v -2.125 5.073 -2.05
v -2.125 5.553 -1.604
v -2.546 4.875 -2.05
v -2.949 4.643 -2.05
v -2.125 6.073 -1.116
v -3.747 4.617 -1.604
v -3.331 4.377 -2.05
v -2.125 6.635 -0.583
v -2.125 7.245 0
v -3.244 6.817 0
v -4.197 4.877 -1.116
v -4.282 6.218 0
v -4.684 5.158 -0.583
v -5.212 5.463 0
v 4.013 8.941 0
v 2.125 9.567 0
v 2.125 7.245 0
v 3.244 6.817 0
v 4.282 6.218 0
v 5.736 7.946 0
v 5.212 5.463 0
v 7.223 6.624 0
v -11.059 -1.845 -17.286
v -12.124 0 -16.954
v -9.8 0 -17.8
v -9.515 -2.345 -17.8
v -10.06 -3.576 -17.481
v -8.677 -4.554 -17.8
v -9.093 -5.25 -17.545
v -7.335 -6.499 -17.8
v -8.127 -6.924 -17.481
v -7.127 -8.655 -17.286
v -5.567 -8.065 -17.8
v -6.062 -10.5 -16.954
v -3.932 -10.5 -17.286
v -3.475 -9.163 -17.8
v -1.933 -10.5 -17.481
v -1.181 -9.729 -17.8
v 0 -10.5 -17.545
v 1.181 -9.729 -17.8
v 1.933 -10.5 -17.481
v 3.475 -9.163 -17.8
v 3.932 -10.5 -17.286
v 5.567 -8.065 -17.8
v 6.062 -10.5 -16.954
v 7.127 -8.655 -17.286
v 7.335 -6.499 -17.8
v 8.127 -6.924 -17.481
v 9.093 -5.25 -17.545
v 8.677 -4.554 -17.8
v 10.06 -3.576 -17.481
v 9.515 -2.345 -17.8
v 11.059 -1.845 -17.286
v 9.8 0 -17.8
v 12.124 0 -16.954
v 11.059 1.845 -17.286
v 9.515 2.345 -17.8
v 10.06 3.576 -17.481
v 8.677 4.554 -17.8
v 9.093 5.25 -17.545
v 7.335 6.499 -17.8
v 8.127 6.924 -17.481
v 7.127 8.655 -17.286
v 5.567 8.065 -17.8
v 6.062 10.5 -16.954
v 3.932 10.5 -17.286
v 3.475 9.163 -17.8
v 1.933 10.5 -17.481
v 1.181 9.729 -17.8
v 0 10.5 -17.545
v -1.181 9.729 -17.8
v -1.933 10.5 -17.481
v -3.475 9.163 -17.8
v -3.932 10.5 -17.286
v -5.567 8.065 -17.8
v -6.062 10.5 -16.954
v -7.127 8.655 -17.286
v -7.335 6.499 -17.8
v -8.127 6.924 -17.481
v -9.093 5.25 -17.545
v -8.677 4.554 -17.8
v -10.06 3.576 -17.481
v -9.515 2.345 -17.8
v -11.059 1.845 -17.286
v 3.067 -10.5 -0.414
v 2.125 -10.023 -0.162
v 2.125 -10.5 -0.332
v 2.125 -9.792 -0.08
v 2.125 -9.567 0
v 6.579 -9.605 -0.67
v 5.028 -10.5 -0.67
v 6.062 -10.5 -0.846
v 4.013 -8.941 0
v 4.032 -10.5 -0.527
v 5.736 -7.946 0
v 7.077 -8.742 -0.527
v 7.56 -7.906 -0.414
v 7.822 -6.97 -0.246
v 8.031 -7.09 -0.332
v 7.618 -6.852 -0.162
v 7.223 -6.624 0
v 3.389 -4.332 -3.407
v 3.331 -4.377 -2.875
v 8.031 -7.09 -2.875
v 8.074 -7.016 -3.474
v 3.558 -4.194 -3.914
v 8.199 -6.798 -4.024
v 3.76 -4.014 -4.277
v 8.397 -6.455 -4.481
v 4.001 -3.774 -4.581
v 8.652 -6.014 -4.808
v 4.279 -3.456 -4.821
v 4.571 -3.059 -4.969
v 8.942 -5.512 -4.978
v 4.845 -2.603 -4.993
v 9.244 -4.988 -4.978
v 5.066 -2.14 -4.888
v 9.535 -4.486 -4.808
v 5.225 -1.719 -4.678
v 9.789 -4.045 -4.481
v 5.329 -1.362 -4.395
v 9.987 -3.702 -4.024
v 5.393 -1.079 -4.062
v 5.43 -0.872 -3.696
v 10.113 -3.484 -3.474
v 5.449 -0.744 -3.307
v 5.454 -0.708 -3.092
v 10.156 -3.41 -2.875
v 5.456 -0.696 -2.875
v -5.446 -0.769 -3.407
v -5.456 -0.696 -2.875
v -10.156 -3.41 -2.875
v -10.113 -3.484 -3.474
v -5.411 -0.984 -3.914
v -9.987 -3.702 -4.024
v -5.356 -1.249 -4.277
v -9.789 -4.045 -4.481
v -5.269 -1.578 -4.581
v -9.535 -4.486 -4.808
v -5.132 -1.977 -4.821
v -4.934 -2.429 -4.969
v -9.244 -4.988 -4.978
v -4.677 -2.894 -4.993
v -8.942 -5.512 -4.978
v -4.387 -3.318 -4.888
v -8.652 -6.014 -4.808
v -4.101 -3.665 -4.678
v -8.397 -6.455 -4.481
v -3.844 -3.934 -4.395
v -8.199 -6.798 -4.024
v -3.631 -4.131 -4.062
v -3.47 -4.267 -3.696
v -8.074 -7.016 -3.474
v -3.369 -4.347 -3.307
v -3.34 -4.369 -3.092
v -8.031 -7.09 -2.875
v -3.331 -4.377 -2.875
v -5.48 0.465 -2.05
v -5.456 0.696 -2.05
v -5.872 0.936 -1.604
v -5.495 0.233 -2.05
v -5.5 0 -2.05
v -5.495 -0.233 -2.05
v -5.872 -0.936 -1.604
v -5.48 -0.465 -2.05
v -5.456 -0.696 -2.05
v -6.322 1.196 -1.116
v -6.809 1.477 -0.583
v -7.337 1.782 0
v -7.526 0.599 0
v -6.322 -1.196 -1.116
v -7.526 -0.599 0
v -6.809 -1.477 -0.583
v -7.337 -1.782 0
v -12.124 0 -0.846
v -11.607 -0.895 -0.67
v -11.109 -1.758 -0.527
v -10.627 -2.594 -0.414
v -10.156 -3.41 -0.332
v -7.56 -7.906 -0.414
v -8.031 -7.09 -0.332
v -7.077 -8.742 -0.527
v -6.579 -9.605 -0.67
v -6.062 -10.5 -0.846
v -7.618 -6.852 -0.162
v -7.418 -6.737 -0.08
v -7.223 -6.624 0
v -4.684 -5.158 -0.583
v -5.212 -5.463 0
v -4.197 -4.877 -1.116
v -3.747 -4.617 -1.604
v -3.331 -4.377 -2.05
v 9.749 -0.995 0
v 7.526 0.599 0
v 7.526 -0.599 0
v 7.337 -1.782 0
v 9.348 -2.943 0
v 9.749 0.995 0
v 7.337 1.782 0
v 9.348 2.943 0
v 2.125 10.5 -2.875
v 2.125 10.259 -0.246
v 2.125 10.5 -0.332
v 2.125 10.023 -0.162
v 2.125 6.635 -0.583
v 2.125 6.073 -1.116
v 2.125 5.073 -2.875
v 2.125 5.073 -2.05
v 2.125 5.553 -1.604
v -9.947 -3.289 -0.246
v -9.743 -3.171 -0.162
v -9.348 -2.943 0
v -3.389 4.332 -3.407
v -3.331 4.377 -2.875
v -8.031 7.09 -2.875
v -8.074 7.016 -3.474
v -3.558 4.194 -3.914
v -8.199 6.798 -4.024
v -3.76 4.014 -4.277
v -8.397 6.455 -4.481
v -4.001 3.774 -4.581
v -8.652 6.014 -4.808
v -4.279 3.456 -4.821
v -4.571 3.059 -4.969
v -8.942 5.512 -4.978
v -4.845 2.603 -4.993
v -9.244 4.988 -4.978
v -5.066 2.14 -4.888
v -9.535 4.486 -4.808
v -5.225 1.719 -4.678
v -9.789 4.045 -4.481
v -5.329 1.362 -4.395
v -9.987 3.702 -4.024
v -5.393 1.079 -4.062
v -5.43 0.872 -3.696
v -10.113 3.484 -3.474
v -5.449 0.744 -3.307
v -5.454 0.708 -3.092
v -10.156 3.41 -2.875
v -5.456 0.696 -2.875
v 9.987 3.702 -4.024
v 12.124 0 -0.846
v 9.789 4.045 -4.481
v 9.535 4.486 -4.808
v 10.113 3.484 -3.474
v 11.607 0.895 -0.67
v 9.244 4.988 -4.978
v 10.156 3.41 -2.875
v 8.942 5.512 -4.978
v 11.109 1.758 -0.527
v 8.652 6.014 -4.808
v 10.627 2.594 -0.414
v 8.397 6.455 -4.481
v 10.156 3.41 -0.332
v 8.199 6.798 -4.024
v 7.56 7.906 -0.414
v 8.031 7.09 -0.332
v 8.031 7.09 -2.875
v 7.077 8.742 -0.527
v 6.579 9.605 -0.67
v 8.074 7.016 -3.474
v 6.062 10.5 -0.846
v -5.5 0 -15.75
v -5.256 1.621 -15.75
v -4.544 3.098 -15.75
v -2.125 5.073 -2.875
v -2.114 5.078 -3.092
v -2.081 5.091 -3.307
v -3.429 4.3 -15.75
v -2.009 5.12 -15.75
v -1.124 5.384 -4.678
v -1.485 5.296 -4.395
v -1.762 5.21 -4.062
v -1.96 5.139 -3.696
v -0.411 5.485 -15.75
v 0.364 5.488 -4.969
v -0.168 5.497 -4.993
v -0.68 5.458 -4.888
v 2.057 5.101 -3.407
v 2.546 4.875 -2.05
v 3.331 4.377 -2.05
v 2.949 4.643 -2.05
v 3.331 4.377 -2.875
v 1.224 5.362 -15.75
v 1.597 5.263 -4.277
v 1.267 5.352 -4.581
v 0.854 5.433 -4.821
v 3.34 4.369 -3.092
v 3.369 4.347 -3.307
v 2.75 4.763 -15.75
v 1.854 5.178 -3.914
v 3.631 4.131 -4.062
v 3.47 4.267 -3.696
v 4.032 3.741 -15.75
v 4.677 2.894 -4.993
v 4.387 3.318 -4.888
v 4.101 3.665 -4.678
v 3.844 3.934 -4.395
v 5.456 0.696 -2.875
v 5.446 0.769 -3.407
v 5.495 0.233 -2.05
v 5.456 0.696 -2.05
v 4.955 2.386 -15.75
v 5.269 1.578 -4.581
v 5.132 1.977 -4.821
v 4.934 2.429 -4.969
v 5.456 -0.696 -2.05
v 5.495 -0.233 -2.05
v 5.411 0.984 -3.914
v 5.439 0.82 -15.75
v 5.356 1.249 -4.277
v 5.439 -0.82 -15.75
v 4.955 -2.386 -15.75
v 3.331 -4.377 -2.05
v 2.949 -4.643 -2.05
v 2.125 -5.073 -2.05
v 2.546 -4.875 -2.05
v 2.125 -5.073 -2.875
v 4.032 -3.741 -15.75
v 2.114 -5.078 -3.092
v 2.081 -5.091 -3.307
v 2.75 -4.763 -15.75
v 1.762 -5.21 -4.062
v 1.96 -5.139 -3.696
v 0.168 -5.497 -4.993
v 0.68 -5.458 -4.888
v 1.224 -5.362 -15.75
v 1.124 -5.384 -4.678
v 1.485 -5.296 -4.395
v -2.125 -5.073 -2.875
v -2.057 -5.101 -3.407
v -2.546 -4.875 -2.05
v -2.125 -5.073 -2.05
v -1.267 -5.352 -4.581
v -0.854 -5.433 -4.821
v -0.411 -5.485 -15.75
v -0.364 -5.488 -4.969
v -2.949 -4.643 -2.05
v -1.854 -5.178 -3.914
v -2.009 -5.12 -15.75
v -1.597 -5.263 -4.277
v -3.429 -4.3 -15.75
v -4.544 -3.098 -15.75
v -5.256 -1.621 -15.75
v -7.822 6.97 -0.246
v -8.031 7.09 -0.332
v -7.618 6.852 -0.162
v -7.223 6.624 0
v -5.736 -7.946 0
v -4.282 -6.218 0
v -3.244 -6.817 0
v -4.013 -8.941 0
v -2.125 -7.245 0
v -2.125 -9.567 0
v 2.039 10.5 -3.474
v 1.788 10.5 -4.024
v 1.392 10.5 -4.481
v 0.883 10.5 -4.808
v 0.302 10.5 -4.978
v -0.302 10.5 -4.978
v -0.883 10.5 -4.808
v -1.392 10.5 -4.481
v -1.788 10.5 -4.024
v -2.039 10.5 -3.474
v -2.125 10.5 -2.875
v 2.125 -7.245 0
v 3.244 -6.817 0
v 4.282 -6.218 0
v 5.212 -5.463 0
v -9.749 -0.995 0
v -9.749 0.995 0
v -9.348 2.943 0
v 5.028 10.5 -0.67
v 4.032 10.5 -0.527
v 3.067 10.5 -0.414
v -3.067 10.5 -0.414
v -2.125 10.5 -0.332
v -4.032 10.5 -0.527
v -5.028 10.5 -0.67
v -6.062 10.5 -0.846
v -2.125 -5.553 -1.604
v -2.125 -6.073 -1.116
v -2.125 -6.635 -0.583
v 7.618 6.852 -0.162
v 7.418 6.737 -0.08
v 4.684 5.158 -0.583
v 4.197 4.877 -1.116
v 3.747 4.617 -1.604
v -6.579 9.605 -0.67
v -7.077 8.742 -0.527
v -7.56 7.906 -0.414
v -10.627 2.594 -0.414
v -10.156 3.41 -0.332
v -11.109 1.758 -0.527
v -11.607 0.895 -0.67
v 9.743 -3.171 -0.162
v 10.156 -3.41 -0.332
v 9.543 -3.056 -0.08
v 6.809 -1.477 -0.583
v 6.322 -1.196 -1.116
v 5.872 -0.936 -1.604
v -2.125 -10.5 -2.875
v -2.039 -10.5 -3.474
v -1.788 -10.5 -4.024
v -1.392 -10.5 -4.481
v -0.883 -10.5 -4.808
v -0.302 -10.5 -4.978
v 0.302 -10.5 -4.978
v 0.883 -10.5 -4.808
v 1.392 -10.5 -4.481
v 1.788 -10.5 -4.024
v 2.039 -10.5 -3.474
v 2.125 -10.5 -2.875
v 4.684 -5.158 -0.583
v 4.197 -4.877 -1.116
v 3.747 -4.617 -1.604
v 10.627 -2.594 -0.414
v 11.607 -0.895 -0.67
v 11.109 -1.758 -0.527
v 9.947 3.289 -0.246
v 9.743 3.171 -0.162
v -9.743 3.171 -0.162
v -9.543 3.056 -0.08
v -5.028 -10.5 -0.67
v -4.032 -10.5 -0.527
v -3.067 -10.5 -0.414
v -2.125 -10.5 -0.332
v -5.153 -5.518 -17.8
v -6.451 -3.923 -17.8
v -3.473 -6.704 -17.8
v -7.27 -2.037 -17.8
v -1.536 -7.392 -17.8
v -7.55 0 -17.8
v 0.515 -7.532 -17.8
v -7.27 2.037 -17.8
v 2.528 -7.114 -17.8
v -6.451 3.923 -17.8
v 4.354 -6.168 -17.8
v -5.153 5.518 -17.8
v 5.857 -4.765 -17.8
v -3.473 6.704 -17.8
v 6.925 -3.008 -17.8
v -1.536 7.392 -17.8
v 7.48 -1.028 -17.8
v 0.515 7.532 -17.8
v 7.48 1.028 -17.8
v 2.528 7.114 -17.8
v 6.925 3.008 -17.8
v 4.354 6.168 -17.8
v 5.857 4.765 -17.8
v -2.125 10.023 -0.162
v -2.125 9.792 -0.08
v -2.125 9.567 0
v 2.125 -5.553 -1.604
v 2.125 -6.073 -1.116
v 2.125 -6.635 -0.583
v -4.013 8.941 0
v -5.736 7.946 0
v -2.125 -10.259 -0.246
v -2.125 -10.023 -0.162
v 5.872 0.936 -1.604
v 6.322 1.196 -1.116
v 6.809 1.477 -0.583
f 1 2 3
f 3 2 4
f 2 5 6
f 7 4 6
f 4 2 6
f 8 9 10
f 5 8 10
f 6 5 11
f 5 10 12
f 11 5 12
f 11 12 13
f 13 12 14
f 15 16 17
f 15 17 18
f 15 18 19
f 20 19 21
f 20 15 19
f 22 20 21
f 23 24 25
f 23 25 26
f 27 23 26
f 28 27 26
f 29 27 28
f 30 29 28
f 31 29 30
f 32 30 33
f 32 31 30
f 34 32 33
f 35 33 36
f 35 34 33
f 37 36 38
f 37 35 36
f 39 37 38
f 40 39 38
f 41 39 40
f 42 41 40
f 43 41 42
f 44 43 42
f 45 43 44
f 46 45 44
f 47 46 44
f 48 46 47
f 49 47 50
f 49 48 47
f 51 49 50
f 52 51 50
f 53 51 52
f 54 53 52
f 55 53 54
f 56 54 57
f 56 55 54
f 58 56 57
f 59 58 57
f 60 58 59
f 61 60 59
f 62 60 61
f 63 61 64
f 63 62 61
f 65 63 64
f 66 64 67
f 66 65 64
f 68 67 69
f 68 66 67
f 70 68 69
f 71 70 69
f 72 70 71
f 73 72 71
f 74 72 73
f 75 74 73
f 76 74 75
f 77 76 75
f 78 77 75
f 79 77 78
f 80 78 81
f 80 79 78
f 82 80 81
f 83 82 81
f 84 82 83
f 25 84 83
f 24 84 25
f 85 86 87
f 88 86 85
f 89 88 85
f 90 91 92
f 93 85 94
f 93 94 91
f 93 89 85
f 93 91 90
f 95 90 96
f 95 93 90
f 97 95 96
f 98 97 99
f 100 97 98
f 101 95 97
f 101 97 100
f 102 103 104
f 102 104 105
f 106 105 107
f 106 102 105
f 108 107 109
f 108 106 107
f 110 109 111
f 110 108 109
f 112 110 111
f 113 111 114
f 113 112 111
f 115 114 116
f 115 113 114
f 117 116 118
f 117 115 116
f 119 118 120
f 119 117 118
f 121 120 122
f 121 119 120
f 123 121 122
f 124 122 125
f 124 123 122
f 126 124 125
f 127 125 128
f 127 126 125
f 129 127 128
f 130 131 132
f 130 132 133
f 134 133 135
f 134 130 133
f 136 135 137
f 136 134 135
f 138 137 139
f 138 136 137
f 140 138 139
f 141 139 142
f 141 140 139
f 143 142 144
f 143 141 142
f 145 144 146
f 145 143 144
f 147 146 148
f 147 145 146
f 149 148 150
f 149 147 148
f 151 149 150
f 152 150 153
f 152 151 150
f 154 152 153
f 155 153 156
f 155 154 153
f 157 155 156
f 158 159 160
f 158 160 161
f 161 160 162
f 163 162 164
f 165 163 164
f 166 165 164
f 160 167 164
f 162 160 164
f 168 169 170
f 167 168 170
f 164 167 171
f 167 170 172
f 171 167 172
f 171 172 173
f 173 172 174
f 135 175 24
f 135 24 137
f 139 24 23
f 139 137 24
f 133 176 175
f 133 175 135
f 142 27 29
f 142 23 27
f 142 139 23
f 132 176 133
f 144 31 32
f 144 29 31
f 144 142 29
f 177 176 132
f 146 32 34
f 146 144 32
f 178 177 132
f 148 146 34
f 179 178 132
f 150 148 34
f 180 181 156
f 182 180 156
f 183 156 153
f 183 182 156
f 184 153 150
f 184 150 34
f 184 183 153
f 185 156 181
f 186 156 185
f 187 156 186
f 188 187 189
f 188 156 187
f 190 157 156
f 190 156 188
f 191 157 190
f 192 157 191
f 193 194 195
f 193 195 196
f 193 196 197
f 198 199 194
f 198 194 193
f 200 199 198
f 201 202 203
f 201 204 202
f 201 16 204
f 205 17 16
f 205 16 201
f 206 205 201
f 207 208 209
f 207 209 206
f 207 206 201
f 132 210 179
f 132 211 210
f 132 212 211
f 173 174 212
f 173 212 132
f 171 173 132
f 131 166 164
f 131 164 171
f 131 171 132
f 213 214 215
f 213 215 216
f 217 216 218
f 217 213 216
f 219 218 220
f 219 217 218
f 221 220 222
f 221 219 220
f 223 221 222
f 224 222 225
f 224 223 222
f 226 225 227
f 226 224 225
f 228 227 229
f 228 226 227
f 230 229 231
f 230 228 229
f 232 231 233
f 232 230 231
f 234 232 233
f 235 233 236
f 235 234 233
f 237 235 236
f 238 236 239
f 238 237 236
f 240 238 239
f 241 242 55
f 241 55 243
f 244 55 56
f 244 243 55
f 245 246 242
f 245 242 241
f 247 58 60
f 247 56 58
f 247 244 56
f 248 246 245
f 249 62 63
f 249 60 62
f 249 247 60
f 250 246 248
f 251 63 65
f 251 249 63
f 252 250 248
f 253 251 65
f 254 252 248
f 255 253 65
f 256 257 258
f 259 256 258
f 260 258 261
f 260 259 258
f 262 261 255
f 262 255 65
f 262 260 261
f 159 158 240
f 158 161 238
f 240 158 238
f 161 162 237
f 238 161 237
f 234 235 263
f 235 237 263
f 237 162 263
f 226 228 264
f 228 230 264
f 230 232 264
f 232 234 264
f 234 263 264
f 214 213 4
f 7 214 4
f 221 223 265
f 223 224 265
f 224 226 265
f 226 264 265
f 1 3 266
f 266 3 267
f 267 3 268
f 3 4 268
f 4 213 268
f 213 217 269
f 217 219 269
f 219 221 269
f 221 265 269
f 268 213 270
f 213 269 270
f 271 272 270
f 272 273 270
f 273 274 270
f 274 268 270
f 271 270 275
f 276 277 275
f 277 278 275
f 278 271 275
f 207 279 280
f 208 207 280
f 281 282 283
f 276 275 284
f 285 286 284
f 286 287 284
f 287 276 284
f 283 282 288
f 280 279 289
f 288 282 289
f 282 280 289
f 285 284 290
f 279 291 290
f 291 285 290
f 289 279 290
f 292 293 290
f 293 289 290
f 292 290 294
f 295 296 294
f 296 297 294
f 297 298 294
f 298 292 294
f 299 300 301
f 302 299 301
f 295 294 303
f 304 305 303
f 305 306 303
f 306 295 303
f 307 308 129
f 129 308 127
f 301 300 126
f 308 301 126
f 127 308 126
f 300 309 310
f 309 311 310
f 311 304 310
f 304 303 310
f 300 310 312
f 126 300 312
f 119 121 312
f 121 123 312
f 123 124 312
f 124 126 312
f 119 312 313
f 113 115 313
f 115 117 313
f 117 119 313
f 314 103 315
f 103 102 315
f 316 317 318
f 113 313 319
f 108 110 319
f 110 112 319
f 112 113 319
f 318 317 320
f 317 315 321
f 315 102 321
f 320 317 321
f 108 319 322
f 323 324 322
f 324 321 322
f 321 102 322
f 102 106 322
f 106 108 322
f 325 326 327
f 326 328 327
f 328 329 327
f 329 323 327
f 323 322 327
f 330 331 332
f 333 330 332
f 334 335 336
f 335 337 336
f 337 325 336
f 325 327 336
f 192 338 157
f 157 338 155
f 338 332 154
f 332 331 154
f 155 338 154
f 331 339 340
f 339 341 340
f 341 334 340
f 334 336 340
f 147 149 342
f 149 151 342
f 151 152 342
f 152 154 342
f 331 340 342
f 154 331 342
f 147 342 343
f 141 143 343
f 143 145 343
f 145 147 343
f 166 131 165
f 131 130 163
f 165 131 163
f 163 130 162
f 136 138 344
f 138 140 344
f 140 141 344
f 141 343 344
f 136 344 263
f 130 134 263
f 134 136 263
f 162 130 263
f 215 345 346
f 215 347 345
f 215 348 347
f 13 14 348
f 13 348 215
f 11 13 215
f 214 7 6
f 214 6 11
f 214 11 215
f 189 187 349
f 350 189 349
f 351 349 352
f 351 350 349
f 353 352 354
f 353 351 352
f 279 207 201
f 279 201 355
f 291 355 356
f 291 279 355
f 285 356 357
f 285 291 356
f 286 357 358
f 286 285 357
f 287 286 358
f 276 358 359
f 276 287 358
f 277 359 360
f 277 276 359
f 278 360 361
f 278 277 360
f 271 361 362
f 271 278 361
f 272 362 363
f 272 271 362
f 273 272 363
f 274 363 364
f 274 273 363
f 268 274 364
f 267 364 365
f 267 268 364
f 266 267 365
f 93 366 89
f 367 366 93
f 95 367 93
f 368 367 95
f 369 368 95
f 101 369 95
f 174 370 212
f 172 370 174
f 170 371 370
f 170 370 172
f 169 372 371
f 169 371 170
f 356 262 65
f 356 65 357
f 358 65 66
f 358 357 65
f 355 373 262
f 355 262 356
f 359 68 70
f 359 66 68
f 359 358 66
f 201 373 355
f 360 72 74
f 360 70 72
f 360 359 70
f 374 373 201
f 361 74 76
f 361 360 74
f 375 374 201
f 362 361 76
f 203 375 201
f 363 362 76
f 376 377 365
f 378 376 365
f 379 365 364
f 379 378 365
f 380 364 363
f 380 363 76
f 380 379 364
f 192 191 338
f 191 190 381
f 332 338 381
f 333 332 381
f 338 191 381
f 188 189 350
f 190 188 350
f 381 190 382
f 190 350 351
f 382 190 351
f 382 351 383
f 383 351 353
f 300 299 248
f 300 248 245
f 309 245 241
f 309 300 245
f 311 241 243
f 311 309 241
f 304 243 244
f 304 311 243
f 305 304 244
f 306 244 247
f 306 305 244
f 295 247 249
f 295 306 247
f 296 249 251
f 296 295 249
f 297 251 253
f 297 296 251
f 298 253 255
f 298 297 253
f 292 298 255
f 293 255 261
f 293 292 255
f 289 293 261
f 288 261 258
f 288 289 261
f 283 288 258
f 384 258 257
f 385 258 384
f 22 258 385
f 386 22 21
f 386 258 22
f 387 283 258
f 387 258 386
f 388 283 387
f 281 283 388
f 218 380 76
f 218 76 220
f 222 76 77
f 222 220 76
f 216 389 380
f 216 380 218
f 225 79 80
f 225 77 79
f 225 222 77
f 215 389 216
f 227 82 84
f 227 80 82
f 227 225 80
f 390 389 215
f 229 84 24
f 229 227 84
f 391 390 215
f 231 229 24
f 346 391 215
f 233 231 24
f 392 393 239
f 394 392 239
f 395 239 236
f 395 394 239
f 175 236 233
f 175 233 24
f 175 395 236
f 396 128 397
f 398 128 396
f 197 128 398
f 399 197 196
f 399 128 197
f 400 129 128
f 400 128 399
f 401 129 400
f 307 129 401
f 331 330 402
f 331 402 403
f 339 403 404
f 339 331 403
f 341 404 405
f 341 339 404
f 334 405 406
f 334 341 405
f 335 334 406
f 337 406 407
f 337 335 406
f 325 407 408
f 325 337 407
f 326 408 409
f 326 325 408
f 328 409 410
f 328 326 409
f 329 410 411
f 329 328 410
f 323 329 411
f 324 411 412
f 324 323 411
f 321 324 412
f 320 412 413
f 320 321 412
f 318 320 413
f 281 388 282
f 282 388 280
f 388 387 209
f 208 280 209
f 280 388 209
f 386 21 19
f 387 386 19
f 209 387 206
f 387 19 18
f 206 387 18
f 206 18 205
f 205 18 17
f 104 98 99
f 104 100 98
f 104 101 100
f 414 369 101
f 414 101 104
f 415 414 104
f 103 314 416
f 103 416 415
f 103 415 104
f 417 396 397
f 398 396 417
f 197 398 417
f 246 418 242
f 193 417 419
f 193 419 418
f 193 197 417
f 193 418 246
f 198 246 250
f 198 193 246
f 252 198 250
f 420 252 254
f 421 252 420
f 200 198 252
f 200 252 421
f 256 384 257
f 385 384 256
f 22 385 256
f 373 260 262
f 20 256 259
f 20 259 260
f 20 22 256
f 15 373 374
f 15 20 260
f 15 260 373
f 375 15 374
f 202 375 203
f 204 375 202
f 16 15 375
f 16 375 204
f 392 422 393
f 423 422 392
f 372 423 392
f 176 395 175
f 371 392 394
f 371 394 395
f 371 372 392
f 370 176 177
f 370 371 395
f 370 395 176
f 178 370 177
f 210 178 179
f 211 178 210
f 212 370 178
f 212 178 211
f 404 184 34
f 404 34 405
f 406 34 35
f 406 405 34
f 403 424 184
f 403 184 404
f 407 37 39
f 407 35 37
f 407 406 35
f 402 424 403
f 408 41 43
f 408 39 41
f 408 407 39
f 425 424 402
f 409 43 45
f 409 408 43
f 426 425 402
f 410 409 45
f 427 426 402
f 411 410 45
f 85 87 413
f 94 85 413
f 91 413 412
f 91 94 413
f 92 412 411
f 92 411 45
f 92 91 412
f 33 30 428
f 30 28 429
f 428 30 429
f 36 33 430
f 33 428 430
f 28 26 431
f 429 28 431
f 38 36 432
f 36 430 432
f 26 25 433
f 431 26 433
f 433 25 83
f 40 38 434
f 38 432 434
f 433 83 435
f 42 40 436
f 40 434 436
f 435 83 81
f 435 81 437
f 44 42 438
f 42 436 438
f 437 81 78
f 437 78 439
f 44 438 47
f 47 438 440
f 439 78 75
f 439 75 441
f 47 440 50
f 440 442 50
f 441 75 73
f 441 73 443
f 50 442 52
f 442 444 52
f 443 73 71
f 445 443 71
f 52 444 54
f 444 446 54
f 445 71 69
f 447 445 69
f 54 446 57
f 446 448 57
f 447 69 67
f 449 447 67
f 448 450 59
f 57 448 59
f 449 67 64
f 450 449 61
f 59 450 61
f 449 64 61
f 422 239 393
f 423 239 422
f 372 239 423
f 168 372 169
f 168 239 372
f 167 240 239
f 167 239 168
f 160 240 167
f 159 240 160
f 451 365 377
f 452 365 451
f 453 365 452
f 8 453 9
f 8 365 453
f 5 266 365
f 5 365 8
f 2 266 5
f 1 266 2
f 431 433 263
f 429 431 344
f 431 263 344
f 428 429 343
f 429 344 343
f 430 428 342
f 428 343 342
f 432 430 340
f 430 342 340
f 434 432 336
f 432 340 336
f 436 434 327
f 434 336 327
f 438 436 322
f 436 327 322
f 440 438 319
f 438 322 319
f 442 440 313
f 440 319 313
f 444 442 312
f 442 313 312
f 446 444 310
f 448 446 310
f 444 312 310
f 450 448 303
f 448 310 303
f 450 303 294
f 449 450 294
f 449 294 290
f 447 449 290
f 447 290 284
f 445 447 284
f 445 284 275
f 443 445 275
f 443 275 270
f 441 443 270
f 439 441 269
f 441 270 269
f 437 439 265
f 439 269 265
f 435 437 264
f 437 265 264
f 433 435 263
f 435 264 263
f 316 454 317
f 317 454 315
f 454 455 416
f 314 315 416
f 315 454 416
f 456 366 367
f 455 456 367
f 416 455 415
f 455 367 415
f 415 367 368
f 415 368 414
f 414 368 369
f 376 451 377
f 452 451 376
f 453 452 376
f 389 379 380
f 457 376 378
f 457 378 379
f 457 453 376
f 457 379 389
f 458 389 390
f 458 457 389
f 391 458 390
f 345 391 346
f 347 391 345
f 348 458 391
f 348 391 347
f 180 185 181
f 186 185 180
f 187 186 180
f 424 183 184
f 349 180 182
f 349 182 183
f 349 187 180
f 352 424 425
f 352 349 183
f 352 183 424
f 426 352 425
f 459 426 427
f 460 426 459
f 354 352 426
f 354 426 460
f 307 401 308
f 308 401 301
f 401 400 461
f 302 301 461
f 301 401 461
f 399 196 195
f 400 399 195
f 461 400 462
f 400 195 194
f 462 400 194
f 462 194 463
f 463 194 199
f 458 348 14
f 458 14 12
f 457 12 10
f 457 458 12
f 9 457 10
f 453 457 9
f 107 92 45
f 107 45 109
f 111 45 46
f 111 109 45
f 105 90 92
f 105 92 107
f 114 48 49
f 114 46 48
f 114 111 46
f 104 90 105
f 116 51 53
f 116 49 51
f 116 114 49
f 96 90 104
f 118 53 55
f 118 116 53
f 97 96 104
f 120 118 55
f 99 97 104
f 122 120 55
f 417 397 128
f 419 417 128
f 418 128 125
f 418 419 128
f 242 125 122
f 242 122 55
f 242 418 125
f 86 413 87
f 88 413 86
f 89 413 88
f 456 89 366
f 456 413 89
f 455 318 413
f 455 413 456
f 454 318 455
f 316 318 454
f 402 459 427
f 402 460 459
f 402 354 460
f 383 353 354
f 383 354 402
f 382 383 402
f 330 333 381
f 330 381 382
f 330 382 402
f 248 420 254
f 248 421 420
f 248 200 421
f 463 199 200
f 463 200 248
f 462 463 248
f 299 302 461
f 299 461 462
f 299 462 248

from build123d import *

# Parameters (mm, degrees)
BASENUT_DEPTH     = 17.8
SKETCH3_R         = 5.5
HOLE_DEPTH        = 28.12289531
SLOT_DEPTH        = 37.36697762
SLOTPATTERN_COUNT = 6


with BuildPart() as part:
    # Sketch1 → BaseNut (new body)
    with BuildSketch(Plane.XY):
        Polygon((6.062177826, -10.5), (12.124355653, 0), (6.062177826, 10.5), (-6.062177826, 10.5), (-12.124355653, 0), (-6.062177826, -10.5), align=None)
    extrude(amount=-BASENUT_DEPTH)

    # Sketch2 → Double-Chamfer (revolve, cut)
    with BuildSketch(Plane(origin=(-3.47179677, 0, -17.32820323), x_dir=(0, 0, -1), z_dir=(0, 1, 0))):
        Polygon((0.47179677, 6.32820323), (-0.374199502, 8.652558883), (0.47179677, 8.652558883), align=None)
        Polygon((-17.32820323, 6.32820323), (-17.32820323, 8.652558883), (-16.482206959, 8.652558883), align=None)
    revolve(axis=Axis((0, 0, -17.32820323), (0, 0, 1)), mode=Mode.SUBTRACT)

    # Sketch3 → Hole (cut, through all)
    with BuildSketch(Plane(origin=(-4.279914938, -1.735659213, -17.8), x_dir=(-1, 0, 0), z_dir=(0, 0, -1))):
        with Locations((-4.279914938, 1.735659213)):
            Circle(SKETCH3_R)
    extrude(amount=-HOLE_DEPTH, mode=Mode.SUBTRACT)

    # Sketch4 → EndChamfer (revolve, cut)
    with BuildSketch(Plane(origin=(-15.758283222, 0, -7.108283222), x_dir=(0, 0, -1), z_dir=(0, 1, 0)), mode=Mode.PRIVATE) as endchamfer_sk:
        Polygon((10.691716778, -23.308283222), (8.641716778, -21.258283222), (10.691716778, -21.258283222), align=None)
        Polygon((-7.108283222, -21.258283222), (-5.058283222, -21.258283222), (-7.108283222, -23.308283222), align=None)
    revolve(endchamfer_sk.sketch.rotate(Axis((0, 0, -7.108283222), (0, 0, 1)), 180), axis=Axis((0, 0, -7.108283222), (0, 0, 1)), mode=Mode.SUBTRACT)

    # Sketch5 → Slot (cut, through all)
    with BuildSketch(Plane(origin=(-17.8, 0, -17.8), x_dir=(0, 0, -1), z_dir=(0, 1, 0))):
        with BuildLine():
            Line((-17.8, -15.675), (-14.925, -15.675))
            ThreePointArc((-14.925, -15.675), (-12.8, -17.8), (-14.925, -19.925))
            Line((-14.925, -19.925), (-17.8, -19.925))
            Line((-17.8, -19.925), (-17.8, -15.675))
        make_face()
    slot = extrude(amount=-SLOT_DEPTH, mode=Mode.SUBTRACT)

    # SlotPattern: Slot ×6 about axis
    slotpattern_axis = Axis((0, 0, 0), (0, 0, 1))
    for i in range(1, SLOTPATTERN_COUNT):
        add(slot.rotate(slotpattern_axis, i * 360 / SLOTPATTERN_COUNT), mode=Mode.SUBTRACT)


solid = part.part
